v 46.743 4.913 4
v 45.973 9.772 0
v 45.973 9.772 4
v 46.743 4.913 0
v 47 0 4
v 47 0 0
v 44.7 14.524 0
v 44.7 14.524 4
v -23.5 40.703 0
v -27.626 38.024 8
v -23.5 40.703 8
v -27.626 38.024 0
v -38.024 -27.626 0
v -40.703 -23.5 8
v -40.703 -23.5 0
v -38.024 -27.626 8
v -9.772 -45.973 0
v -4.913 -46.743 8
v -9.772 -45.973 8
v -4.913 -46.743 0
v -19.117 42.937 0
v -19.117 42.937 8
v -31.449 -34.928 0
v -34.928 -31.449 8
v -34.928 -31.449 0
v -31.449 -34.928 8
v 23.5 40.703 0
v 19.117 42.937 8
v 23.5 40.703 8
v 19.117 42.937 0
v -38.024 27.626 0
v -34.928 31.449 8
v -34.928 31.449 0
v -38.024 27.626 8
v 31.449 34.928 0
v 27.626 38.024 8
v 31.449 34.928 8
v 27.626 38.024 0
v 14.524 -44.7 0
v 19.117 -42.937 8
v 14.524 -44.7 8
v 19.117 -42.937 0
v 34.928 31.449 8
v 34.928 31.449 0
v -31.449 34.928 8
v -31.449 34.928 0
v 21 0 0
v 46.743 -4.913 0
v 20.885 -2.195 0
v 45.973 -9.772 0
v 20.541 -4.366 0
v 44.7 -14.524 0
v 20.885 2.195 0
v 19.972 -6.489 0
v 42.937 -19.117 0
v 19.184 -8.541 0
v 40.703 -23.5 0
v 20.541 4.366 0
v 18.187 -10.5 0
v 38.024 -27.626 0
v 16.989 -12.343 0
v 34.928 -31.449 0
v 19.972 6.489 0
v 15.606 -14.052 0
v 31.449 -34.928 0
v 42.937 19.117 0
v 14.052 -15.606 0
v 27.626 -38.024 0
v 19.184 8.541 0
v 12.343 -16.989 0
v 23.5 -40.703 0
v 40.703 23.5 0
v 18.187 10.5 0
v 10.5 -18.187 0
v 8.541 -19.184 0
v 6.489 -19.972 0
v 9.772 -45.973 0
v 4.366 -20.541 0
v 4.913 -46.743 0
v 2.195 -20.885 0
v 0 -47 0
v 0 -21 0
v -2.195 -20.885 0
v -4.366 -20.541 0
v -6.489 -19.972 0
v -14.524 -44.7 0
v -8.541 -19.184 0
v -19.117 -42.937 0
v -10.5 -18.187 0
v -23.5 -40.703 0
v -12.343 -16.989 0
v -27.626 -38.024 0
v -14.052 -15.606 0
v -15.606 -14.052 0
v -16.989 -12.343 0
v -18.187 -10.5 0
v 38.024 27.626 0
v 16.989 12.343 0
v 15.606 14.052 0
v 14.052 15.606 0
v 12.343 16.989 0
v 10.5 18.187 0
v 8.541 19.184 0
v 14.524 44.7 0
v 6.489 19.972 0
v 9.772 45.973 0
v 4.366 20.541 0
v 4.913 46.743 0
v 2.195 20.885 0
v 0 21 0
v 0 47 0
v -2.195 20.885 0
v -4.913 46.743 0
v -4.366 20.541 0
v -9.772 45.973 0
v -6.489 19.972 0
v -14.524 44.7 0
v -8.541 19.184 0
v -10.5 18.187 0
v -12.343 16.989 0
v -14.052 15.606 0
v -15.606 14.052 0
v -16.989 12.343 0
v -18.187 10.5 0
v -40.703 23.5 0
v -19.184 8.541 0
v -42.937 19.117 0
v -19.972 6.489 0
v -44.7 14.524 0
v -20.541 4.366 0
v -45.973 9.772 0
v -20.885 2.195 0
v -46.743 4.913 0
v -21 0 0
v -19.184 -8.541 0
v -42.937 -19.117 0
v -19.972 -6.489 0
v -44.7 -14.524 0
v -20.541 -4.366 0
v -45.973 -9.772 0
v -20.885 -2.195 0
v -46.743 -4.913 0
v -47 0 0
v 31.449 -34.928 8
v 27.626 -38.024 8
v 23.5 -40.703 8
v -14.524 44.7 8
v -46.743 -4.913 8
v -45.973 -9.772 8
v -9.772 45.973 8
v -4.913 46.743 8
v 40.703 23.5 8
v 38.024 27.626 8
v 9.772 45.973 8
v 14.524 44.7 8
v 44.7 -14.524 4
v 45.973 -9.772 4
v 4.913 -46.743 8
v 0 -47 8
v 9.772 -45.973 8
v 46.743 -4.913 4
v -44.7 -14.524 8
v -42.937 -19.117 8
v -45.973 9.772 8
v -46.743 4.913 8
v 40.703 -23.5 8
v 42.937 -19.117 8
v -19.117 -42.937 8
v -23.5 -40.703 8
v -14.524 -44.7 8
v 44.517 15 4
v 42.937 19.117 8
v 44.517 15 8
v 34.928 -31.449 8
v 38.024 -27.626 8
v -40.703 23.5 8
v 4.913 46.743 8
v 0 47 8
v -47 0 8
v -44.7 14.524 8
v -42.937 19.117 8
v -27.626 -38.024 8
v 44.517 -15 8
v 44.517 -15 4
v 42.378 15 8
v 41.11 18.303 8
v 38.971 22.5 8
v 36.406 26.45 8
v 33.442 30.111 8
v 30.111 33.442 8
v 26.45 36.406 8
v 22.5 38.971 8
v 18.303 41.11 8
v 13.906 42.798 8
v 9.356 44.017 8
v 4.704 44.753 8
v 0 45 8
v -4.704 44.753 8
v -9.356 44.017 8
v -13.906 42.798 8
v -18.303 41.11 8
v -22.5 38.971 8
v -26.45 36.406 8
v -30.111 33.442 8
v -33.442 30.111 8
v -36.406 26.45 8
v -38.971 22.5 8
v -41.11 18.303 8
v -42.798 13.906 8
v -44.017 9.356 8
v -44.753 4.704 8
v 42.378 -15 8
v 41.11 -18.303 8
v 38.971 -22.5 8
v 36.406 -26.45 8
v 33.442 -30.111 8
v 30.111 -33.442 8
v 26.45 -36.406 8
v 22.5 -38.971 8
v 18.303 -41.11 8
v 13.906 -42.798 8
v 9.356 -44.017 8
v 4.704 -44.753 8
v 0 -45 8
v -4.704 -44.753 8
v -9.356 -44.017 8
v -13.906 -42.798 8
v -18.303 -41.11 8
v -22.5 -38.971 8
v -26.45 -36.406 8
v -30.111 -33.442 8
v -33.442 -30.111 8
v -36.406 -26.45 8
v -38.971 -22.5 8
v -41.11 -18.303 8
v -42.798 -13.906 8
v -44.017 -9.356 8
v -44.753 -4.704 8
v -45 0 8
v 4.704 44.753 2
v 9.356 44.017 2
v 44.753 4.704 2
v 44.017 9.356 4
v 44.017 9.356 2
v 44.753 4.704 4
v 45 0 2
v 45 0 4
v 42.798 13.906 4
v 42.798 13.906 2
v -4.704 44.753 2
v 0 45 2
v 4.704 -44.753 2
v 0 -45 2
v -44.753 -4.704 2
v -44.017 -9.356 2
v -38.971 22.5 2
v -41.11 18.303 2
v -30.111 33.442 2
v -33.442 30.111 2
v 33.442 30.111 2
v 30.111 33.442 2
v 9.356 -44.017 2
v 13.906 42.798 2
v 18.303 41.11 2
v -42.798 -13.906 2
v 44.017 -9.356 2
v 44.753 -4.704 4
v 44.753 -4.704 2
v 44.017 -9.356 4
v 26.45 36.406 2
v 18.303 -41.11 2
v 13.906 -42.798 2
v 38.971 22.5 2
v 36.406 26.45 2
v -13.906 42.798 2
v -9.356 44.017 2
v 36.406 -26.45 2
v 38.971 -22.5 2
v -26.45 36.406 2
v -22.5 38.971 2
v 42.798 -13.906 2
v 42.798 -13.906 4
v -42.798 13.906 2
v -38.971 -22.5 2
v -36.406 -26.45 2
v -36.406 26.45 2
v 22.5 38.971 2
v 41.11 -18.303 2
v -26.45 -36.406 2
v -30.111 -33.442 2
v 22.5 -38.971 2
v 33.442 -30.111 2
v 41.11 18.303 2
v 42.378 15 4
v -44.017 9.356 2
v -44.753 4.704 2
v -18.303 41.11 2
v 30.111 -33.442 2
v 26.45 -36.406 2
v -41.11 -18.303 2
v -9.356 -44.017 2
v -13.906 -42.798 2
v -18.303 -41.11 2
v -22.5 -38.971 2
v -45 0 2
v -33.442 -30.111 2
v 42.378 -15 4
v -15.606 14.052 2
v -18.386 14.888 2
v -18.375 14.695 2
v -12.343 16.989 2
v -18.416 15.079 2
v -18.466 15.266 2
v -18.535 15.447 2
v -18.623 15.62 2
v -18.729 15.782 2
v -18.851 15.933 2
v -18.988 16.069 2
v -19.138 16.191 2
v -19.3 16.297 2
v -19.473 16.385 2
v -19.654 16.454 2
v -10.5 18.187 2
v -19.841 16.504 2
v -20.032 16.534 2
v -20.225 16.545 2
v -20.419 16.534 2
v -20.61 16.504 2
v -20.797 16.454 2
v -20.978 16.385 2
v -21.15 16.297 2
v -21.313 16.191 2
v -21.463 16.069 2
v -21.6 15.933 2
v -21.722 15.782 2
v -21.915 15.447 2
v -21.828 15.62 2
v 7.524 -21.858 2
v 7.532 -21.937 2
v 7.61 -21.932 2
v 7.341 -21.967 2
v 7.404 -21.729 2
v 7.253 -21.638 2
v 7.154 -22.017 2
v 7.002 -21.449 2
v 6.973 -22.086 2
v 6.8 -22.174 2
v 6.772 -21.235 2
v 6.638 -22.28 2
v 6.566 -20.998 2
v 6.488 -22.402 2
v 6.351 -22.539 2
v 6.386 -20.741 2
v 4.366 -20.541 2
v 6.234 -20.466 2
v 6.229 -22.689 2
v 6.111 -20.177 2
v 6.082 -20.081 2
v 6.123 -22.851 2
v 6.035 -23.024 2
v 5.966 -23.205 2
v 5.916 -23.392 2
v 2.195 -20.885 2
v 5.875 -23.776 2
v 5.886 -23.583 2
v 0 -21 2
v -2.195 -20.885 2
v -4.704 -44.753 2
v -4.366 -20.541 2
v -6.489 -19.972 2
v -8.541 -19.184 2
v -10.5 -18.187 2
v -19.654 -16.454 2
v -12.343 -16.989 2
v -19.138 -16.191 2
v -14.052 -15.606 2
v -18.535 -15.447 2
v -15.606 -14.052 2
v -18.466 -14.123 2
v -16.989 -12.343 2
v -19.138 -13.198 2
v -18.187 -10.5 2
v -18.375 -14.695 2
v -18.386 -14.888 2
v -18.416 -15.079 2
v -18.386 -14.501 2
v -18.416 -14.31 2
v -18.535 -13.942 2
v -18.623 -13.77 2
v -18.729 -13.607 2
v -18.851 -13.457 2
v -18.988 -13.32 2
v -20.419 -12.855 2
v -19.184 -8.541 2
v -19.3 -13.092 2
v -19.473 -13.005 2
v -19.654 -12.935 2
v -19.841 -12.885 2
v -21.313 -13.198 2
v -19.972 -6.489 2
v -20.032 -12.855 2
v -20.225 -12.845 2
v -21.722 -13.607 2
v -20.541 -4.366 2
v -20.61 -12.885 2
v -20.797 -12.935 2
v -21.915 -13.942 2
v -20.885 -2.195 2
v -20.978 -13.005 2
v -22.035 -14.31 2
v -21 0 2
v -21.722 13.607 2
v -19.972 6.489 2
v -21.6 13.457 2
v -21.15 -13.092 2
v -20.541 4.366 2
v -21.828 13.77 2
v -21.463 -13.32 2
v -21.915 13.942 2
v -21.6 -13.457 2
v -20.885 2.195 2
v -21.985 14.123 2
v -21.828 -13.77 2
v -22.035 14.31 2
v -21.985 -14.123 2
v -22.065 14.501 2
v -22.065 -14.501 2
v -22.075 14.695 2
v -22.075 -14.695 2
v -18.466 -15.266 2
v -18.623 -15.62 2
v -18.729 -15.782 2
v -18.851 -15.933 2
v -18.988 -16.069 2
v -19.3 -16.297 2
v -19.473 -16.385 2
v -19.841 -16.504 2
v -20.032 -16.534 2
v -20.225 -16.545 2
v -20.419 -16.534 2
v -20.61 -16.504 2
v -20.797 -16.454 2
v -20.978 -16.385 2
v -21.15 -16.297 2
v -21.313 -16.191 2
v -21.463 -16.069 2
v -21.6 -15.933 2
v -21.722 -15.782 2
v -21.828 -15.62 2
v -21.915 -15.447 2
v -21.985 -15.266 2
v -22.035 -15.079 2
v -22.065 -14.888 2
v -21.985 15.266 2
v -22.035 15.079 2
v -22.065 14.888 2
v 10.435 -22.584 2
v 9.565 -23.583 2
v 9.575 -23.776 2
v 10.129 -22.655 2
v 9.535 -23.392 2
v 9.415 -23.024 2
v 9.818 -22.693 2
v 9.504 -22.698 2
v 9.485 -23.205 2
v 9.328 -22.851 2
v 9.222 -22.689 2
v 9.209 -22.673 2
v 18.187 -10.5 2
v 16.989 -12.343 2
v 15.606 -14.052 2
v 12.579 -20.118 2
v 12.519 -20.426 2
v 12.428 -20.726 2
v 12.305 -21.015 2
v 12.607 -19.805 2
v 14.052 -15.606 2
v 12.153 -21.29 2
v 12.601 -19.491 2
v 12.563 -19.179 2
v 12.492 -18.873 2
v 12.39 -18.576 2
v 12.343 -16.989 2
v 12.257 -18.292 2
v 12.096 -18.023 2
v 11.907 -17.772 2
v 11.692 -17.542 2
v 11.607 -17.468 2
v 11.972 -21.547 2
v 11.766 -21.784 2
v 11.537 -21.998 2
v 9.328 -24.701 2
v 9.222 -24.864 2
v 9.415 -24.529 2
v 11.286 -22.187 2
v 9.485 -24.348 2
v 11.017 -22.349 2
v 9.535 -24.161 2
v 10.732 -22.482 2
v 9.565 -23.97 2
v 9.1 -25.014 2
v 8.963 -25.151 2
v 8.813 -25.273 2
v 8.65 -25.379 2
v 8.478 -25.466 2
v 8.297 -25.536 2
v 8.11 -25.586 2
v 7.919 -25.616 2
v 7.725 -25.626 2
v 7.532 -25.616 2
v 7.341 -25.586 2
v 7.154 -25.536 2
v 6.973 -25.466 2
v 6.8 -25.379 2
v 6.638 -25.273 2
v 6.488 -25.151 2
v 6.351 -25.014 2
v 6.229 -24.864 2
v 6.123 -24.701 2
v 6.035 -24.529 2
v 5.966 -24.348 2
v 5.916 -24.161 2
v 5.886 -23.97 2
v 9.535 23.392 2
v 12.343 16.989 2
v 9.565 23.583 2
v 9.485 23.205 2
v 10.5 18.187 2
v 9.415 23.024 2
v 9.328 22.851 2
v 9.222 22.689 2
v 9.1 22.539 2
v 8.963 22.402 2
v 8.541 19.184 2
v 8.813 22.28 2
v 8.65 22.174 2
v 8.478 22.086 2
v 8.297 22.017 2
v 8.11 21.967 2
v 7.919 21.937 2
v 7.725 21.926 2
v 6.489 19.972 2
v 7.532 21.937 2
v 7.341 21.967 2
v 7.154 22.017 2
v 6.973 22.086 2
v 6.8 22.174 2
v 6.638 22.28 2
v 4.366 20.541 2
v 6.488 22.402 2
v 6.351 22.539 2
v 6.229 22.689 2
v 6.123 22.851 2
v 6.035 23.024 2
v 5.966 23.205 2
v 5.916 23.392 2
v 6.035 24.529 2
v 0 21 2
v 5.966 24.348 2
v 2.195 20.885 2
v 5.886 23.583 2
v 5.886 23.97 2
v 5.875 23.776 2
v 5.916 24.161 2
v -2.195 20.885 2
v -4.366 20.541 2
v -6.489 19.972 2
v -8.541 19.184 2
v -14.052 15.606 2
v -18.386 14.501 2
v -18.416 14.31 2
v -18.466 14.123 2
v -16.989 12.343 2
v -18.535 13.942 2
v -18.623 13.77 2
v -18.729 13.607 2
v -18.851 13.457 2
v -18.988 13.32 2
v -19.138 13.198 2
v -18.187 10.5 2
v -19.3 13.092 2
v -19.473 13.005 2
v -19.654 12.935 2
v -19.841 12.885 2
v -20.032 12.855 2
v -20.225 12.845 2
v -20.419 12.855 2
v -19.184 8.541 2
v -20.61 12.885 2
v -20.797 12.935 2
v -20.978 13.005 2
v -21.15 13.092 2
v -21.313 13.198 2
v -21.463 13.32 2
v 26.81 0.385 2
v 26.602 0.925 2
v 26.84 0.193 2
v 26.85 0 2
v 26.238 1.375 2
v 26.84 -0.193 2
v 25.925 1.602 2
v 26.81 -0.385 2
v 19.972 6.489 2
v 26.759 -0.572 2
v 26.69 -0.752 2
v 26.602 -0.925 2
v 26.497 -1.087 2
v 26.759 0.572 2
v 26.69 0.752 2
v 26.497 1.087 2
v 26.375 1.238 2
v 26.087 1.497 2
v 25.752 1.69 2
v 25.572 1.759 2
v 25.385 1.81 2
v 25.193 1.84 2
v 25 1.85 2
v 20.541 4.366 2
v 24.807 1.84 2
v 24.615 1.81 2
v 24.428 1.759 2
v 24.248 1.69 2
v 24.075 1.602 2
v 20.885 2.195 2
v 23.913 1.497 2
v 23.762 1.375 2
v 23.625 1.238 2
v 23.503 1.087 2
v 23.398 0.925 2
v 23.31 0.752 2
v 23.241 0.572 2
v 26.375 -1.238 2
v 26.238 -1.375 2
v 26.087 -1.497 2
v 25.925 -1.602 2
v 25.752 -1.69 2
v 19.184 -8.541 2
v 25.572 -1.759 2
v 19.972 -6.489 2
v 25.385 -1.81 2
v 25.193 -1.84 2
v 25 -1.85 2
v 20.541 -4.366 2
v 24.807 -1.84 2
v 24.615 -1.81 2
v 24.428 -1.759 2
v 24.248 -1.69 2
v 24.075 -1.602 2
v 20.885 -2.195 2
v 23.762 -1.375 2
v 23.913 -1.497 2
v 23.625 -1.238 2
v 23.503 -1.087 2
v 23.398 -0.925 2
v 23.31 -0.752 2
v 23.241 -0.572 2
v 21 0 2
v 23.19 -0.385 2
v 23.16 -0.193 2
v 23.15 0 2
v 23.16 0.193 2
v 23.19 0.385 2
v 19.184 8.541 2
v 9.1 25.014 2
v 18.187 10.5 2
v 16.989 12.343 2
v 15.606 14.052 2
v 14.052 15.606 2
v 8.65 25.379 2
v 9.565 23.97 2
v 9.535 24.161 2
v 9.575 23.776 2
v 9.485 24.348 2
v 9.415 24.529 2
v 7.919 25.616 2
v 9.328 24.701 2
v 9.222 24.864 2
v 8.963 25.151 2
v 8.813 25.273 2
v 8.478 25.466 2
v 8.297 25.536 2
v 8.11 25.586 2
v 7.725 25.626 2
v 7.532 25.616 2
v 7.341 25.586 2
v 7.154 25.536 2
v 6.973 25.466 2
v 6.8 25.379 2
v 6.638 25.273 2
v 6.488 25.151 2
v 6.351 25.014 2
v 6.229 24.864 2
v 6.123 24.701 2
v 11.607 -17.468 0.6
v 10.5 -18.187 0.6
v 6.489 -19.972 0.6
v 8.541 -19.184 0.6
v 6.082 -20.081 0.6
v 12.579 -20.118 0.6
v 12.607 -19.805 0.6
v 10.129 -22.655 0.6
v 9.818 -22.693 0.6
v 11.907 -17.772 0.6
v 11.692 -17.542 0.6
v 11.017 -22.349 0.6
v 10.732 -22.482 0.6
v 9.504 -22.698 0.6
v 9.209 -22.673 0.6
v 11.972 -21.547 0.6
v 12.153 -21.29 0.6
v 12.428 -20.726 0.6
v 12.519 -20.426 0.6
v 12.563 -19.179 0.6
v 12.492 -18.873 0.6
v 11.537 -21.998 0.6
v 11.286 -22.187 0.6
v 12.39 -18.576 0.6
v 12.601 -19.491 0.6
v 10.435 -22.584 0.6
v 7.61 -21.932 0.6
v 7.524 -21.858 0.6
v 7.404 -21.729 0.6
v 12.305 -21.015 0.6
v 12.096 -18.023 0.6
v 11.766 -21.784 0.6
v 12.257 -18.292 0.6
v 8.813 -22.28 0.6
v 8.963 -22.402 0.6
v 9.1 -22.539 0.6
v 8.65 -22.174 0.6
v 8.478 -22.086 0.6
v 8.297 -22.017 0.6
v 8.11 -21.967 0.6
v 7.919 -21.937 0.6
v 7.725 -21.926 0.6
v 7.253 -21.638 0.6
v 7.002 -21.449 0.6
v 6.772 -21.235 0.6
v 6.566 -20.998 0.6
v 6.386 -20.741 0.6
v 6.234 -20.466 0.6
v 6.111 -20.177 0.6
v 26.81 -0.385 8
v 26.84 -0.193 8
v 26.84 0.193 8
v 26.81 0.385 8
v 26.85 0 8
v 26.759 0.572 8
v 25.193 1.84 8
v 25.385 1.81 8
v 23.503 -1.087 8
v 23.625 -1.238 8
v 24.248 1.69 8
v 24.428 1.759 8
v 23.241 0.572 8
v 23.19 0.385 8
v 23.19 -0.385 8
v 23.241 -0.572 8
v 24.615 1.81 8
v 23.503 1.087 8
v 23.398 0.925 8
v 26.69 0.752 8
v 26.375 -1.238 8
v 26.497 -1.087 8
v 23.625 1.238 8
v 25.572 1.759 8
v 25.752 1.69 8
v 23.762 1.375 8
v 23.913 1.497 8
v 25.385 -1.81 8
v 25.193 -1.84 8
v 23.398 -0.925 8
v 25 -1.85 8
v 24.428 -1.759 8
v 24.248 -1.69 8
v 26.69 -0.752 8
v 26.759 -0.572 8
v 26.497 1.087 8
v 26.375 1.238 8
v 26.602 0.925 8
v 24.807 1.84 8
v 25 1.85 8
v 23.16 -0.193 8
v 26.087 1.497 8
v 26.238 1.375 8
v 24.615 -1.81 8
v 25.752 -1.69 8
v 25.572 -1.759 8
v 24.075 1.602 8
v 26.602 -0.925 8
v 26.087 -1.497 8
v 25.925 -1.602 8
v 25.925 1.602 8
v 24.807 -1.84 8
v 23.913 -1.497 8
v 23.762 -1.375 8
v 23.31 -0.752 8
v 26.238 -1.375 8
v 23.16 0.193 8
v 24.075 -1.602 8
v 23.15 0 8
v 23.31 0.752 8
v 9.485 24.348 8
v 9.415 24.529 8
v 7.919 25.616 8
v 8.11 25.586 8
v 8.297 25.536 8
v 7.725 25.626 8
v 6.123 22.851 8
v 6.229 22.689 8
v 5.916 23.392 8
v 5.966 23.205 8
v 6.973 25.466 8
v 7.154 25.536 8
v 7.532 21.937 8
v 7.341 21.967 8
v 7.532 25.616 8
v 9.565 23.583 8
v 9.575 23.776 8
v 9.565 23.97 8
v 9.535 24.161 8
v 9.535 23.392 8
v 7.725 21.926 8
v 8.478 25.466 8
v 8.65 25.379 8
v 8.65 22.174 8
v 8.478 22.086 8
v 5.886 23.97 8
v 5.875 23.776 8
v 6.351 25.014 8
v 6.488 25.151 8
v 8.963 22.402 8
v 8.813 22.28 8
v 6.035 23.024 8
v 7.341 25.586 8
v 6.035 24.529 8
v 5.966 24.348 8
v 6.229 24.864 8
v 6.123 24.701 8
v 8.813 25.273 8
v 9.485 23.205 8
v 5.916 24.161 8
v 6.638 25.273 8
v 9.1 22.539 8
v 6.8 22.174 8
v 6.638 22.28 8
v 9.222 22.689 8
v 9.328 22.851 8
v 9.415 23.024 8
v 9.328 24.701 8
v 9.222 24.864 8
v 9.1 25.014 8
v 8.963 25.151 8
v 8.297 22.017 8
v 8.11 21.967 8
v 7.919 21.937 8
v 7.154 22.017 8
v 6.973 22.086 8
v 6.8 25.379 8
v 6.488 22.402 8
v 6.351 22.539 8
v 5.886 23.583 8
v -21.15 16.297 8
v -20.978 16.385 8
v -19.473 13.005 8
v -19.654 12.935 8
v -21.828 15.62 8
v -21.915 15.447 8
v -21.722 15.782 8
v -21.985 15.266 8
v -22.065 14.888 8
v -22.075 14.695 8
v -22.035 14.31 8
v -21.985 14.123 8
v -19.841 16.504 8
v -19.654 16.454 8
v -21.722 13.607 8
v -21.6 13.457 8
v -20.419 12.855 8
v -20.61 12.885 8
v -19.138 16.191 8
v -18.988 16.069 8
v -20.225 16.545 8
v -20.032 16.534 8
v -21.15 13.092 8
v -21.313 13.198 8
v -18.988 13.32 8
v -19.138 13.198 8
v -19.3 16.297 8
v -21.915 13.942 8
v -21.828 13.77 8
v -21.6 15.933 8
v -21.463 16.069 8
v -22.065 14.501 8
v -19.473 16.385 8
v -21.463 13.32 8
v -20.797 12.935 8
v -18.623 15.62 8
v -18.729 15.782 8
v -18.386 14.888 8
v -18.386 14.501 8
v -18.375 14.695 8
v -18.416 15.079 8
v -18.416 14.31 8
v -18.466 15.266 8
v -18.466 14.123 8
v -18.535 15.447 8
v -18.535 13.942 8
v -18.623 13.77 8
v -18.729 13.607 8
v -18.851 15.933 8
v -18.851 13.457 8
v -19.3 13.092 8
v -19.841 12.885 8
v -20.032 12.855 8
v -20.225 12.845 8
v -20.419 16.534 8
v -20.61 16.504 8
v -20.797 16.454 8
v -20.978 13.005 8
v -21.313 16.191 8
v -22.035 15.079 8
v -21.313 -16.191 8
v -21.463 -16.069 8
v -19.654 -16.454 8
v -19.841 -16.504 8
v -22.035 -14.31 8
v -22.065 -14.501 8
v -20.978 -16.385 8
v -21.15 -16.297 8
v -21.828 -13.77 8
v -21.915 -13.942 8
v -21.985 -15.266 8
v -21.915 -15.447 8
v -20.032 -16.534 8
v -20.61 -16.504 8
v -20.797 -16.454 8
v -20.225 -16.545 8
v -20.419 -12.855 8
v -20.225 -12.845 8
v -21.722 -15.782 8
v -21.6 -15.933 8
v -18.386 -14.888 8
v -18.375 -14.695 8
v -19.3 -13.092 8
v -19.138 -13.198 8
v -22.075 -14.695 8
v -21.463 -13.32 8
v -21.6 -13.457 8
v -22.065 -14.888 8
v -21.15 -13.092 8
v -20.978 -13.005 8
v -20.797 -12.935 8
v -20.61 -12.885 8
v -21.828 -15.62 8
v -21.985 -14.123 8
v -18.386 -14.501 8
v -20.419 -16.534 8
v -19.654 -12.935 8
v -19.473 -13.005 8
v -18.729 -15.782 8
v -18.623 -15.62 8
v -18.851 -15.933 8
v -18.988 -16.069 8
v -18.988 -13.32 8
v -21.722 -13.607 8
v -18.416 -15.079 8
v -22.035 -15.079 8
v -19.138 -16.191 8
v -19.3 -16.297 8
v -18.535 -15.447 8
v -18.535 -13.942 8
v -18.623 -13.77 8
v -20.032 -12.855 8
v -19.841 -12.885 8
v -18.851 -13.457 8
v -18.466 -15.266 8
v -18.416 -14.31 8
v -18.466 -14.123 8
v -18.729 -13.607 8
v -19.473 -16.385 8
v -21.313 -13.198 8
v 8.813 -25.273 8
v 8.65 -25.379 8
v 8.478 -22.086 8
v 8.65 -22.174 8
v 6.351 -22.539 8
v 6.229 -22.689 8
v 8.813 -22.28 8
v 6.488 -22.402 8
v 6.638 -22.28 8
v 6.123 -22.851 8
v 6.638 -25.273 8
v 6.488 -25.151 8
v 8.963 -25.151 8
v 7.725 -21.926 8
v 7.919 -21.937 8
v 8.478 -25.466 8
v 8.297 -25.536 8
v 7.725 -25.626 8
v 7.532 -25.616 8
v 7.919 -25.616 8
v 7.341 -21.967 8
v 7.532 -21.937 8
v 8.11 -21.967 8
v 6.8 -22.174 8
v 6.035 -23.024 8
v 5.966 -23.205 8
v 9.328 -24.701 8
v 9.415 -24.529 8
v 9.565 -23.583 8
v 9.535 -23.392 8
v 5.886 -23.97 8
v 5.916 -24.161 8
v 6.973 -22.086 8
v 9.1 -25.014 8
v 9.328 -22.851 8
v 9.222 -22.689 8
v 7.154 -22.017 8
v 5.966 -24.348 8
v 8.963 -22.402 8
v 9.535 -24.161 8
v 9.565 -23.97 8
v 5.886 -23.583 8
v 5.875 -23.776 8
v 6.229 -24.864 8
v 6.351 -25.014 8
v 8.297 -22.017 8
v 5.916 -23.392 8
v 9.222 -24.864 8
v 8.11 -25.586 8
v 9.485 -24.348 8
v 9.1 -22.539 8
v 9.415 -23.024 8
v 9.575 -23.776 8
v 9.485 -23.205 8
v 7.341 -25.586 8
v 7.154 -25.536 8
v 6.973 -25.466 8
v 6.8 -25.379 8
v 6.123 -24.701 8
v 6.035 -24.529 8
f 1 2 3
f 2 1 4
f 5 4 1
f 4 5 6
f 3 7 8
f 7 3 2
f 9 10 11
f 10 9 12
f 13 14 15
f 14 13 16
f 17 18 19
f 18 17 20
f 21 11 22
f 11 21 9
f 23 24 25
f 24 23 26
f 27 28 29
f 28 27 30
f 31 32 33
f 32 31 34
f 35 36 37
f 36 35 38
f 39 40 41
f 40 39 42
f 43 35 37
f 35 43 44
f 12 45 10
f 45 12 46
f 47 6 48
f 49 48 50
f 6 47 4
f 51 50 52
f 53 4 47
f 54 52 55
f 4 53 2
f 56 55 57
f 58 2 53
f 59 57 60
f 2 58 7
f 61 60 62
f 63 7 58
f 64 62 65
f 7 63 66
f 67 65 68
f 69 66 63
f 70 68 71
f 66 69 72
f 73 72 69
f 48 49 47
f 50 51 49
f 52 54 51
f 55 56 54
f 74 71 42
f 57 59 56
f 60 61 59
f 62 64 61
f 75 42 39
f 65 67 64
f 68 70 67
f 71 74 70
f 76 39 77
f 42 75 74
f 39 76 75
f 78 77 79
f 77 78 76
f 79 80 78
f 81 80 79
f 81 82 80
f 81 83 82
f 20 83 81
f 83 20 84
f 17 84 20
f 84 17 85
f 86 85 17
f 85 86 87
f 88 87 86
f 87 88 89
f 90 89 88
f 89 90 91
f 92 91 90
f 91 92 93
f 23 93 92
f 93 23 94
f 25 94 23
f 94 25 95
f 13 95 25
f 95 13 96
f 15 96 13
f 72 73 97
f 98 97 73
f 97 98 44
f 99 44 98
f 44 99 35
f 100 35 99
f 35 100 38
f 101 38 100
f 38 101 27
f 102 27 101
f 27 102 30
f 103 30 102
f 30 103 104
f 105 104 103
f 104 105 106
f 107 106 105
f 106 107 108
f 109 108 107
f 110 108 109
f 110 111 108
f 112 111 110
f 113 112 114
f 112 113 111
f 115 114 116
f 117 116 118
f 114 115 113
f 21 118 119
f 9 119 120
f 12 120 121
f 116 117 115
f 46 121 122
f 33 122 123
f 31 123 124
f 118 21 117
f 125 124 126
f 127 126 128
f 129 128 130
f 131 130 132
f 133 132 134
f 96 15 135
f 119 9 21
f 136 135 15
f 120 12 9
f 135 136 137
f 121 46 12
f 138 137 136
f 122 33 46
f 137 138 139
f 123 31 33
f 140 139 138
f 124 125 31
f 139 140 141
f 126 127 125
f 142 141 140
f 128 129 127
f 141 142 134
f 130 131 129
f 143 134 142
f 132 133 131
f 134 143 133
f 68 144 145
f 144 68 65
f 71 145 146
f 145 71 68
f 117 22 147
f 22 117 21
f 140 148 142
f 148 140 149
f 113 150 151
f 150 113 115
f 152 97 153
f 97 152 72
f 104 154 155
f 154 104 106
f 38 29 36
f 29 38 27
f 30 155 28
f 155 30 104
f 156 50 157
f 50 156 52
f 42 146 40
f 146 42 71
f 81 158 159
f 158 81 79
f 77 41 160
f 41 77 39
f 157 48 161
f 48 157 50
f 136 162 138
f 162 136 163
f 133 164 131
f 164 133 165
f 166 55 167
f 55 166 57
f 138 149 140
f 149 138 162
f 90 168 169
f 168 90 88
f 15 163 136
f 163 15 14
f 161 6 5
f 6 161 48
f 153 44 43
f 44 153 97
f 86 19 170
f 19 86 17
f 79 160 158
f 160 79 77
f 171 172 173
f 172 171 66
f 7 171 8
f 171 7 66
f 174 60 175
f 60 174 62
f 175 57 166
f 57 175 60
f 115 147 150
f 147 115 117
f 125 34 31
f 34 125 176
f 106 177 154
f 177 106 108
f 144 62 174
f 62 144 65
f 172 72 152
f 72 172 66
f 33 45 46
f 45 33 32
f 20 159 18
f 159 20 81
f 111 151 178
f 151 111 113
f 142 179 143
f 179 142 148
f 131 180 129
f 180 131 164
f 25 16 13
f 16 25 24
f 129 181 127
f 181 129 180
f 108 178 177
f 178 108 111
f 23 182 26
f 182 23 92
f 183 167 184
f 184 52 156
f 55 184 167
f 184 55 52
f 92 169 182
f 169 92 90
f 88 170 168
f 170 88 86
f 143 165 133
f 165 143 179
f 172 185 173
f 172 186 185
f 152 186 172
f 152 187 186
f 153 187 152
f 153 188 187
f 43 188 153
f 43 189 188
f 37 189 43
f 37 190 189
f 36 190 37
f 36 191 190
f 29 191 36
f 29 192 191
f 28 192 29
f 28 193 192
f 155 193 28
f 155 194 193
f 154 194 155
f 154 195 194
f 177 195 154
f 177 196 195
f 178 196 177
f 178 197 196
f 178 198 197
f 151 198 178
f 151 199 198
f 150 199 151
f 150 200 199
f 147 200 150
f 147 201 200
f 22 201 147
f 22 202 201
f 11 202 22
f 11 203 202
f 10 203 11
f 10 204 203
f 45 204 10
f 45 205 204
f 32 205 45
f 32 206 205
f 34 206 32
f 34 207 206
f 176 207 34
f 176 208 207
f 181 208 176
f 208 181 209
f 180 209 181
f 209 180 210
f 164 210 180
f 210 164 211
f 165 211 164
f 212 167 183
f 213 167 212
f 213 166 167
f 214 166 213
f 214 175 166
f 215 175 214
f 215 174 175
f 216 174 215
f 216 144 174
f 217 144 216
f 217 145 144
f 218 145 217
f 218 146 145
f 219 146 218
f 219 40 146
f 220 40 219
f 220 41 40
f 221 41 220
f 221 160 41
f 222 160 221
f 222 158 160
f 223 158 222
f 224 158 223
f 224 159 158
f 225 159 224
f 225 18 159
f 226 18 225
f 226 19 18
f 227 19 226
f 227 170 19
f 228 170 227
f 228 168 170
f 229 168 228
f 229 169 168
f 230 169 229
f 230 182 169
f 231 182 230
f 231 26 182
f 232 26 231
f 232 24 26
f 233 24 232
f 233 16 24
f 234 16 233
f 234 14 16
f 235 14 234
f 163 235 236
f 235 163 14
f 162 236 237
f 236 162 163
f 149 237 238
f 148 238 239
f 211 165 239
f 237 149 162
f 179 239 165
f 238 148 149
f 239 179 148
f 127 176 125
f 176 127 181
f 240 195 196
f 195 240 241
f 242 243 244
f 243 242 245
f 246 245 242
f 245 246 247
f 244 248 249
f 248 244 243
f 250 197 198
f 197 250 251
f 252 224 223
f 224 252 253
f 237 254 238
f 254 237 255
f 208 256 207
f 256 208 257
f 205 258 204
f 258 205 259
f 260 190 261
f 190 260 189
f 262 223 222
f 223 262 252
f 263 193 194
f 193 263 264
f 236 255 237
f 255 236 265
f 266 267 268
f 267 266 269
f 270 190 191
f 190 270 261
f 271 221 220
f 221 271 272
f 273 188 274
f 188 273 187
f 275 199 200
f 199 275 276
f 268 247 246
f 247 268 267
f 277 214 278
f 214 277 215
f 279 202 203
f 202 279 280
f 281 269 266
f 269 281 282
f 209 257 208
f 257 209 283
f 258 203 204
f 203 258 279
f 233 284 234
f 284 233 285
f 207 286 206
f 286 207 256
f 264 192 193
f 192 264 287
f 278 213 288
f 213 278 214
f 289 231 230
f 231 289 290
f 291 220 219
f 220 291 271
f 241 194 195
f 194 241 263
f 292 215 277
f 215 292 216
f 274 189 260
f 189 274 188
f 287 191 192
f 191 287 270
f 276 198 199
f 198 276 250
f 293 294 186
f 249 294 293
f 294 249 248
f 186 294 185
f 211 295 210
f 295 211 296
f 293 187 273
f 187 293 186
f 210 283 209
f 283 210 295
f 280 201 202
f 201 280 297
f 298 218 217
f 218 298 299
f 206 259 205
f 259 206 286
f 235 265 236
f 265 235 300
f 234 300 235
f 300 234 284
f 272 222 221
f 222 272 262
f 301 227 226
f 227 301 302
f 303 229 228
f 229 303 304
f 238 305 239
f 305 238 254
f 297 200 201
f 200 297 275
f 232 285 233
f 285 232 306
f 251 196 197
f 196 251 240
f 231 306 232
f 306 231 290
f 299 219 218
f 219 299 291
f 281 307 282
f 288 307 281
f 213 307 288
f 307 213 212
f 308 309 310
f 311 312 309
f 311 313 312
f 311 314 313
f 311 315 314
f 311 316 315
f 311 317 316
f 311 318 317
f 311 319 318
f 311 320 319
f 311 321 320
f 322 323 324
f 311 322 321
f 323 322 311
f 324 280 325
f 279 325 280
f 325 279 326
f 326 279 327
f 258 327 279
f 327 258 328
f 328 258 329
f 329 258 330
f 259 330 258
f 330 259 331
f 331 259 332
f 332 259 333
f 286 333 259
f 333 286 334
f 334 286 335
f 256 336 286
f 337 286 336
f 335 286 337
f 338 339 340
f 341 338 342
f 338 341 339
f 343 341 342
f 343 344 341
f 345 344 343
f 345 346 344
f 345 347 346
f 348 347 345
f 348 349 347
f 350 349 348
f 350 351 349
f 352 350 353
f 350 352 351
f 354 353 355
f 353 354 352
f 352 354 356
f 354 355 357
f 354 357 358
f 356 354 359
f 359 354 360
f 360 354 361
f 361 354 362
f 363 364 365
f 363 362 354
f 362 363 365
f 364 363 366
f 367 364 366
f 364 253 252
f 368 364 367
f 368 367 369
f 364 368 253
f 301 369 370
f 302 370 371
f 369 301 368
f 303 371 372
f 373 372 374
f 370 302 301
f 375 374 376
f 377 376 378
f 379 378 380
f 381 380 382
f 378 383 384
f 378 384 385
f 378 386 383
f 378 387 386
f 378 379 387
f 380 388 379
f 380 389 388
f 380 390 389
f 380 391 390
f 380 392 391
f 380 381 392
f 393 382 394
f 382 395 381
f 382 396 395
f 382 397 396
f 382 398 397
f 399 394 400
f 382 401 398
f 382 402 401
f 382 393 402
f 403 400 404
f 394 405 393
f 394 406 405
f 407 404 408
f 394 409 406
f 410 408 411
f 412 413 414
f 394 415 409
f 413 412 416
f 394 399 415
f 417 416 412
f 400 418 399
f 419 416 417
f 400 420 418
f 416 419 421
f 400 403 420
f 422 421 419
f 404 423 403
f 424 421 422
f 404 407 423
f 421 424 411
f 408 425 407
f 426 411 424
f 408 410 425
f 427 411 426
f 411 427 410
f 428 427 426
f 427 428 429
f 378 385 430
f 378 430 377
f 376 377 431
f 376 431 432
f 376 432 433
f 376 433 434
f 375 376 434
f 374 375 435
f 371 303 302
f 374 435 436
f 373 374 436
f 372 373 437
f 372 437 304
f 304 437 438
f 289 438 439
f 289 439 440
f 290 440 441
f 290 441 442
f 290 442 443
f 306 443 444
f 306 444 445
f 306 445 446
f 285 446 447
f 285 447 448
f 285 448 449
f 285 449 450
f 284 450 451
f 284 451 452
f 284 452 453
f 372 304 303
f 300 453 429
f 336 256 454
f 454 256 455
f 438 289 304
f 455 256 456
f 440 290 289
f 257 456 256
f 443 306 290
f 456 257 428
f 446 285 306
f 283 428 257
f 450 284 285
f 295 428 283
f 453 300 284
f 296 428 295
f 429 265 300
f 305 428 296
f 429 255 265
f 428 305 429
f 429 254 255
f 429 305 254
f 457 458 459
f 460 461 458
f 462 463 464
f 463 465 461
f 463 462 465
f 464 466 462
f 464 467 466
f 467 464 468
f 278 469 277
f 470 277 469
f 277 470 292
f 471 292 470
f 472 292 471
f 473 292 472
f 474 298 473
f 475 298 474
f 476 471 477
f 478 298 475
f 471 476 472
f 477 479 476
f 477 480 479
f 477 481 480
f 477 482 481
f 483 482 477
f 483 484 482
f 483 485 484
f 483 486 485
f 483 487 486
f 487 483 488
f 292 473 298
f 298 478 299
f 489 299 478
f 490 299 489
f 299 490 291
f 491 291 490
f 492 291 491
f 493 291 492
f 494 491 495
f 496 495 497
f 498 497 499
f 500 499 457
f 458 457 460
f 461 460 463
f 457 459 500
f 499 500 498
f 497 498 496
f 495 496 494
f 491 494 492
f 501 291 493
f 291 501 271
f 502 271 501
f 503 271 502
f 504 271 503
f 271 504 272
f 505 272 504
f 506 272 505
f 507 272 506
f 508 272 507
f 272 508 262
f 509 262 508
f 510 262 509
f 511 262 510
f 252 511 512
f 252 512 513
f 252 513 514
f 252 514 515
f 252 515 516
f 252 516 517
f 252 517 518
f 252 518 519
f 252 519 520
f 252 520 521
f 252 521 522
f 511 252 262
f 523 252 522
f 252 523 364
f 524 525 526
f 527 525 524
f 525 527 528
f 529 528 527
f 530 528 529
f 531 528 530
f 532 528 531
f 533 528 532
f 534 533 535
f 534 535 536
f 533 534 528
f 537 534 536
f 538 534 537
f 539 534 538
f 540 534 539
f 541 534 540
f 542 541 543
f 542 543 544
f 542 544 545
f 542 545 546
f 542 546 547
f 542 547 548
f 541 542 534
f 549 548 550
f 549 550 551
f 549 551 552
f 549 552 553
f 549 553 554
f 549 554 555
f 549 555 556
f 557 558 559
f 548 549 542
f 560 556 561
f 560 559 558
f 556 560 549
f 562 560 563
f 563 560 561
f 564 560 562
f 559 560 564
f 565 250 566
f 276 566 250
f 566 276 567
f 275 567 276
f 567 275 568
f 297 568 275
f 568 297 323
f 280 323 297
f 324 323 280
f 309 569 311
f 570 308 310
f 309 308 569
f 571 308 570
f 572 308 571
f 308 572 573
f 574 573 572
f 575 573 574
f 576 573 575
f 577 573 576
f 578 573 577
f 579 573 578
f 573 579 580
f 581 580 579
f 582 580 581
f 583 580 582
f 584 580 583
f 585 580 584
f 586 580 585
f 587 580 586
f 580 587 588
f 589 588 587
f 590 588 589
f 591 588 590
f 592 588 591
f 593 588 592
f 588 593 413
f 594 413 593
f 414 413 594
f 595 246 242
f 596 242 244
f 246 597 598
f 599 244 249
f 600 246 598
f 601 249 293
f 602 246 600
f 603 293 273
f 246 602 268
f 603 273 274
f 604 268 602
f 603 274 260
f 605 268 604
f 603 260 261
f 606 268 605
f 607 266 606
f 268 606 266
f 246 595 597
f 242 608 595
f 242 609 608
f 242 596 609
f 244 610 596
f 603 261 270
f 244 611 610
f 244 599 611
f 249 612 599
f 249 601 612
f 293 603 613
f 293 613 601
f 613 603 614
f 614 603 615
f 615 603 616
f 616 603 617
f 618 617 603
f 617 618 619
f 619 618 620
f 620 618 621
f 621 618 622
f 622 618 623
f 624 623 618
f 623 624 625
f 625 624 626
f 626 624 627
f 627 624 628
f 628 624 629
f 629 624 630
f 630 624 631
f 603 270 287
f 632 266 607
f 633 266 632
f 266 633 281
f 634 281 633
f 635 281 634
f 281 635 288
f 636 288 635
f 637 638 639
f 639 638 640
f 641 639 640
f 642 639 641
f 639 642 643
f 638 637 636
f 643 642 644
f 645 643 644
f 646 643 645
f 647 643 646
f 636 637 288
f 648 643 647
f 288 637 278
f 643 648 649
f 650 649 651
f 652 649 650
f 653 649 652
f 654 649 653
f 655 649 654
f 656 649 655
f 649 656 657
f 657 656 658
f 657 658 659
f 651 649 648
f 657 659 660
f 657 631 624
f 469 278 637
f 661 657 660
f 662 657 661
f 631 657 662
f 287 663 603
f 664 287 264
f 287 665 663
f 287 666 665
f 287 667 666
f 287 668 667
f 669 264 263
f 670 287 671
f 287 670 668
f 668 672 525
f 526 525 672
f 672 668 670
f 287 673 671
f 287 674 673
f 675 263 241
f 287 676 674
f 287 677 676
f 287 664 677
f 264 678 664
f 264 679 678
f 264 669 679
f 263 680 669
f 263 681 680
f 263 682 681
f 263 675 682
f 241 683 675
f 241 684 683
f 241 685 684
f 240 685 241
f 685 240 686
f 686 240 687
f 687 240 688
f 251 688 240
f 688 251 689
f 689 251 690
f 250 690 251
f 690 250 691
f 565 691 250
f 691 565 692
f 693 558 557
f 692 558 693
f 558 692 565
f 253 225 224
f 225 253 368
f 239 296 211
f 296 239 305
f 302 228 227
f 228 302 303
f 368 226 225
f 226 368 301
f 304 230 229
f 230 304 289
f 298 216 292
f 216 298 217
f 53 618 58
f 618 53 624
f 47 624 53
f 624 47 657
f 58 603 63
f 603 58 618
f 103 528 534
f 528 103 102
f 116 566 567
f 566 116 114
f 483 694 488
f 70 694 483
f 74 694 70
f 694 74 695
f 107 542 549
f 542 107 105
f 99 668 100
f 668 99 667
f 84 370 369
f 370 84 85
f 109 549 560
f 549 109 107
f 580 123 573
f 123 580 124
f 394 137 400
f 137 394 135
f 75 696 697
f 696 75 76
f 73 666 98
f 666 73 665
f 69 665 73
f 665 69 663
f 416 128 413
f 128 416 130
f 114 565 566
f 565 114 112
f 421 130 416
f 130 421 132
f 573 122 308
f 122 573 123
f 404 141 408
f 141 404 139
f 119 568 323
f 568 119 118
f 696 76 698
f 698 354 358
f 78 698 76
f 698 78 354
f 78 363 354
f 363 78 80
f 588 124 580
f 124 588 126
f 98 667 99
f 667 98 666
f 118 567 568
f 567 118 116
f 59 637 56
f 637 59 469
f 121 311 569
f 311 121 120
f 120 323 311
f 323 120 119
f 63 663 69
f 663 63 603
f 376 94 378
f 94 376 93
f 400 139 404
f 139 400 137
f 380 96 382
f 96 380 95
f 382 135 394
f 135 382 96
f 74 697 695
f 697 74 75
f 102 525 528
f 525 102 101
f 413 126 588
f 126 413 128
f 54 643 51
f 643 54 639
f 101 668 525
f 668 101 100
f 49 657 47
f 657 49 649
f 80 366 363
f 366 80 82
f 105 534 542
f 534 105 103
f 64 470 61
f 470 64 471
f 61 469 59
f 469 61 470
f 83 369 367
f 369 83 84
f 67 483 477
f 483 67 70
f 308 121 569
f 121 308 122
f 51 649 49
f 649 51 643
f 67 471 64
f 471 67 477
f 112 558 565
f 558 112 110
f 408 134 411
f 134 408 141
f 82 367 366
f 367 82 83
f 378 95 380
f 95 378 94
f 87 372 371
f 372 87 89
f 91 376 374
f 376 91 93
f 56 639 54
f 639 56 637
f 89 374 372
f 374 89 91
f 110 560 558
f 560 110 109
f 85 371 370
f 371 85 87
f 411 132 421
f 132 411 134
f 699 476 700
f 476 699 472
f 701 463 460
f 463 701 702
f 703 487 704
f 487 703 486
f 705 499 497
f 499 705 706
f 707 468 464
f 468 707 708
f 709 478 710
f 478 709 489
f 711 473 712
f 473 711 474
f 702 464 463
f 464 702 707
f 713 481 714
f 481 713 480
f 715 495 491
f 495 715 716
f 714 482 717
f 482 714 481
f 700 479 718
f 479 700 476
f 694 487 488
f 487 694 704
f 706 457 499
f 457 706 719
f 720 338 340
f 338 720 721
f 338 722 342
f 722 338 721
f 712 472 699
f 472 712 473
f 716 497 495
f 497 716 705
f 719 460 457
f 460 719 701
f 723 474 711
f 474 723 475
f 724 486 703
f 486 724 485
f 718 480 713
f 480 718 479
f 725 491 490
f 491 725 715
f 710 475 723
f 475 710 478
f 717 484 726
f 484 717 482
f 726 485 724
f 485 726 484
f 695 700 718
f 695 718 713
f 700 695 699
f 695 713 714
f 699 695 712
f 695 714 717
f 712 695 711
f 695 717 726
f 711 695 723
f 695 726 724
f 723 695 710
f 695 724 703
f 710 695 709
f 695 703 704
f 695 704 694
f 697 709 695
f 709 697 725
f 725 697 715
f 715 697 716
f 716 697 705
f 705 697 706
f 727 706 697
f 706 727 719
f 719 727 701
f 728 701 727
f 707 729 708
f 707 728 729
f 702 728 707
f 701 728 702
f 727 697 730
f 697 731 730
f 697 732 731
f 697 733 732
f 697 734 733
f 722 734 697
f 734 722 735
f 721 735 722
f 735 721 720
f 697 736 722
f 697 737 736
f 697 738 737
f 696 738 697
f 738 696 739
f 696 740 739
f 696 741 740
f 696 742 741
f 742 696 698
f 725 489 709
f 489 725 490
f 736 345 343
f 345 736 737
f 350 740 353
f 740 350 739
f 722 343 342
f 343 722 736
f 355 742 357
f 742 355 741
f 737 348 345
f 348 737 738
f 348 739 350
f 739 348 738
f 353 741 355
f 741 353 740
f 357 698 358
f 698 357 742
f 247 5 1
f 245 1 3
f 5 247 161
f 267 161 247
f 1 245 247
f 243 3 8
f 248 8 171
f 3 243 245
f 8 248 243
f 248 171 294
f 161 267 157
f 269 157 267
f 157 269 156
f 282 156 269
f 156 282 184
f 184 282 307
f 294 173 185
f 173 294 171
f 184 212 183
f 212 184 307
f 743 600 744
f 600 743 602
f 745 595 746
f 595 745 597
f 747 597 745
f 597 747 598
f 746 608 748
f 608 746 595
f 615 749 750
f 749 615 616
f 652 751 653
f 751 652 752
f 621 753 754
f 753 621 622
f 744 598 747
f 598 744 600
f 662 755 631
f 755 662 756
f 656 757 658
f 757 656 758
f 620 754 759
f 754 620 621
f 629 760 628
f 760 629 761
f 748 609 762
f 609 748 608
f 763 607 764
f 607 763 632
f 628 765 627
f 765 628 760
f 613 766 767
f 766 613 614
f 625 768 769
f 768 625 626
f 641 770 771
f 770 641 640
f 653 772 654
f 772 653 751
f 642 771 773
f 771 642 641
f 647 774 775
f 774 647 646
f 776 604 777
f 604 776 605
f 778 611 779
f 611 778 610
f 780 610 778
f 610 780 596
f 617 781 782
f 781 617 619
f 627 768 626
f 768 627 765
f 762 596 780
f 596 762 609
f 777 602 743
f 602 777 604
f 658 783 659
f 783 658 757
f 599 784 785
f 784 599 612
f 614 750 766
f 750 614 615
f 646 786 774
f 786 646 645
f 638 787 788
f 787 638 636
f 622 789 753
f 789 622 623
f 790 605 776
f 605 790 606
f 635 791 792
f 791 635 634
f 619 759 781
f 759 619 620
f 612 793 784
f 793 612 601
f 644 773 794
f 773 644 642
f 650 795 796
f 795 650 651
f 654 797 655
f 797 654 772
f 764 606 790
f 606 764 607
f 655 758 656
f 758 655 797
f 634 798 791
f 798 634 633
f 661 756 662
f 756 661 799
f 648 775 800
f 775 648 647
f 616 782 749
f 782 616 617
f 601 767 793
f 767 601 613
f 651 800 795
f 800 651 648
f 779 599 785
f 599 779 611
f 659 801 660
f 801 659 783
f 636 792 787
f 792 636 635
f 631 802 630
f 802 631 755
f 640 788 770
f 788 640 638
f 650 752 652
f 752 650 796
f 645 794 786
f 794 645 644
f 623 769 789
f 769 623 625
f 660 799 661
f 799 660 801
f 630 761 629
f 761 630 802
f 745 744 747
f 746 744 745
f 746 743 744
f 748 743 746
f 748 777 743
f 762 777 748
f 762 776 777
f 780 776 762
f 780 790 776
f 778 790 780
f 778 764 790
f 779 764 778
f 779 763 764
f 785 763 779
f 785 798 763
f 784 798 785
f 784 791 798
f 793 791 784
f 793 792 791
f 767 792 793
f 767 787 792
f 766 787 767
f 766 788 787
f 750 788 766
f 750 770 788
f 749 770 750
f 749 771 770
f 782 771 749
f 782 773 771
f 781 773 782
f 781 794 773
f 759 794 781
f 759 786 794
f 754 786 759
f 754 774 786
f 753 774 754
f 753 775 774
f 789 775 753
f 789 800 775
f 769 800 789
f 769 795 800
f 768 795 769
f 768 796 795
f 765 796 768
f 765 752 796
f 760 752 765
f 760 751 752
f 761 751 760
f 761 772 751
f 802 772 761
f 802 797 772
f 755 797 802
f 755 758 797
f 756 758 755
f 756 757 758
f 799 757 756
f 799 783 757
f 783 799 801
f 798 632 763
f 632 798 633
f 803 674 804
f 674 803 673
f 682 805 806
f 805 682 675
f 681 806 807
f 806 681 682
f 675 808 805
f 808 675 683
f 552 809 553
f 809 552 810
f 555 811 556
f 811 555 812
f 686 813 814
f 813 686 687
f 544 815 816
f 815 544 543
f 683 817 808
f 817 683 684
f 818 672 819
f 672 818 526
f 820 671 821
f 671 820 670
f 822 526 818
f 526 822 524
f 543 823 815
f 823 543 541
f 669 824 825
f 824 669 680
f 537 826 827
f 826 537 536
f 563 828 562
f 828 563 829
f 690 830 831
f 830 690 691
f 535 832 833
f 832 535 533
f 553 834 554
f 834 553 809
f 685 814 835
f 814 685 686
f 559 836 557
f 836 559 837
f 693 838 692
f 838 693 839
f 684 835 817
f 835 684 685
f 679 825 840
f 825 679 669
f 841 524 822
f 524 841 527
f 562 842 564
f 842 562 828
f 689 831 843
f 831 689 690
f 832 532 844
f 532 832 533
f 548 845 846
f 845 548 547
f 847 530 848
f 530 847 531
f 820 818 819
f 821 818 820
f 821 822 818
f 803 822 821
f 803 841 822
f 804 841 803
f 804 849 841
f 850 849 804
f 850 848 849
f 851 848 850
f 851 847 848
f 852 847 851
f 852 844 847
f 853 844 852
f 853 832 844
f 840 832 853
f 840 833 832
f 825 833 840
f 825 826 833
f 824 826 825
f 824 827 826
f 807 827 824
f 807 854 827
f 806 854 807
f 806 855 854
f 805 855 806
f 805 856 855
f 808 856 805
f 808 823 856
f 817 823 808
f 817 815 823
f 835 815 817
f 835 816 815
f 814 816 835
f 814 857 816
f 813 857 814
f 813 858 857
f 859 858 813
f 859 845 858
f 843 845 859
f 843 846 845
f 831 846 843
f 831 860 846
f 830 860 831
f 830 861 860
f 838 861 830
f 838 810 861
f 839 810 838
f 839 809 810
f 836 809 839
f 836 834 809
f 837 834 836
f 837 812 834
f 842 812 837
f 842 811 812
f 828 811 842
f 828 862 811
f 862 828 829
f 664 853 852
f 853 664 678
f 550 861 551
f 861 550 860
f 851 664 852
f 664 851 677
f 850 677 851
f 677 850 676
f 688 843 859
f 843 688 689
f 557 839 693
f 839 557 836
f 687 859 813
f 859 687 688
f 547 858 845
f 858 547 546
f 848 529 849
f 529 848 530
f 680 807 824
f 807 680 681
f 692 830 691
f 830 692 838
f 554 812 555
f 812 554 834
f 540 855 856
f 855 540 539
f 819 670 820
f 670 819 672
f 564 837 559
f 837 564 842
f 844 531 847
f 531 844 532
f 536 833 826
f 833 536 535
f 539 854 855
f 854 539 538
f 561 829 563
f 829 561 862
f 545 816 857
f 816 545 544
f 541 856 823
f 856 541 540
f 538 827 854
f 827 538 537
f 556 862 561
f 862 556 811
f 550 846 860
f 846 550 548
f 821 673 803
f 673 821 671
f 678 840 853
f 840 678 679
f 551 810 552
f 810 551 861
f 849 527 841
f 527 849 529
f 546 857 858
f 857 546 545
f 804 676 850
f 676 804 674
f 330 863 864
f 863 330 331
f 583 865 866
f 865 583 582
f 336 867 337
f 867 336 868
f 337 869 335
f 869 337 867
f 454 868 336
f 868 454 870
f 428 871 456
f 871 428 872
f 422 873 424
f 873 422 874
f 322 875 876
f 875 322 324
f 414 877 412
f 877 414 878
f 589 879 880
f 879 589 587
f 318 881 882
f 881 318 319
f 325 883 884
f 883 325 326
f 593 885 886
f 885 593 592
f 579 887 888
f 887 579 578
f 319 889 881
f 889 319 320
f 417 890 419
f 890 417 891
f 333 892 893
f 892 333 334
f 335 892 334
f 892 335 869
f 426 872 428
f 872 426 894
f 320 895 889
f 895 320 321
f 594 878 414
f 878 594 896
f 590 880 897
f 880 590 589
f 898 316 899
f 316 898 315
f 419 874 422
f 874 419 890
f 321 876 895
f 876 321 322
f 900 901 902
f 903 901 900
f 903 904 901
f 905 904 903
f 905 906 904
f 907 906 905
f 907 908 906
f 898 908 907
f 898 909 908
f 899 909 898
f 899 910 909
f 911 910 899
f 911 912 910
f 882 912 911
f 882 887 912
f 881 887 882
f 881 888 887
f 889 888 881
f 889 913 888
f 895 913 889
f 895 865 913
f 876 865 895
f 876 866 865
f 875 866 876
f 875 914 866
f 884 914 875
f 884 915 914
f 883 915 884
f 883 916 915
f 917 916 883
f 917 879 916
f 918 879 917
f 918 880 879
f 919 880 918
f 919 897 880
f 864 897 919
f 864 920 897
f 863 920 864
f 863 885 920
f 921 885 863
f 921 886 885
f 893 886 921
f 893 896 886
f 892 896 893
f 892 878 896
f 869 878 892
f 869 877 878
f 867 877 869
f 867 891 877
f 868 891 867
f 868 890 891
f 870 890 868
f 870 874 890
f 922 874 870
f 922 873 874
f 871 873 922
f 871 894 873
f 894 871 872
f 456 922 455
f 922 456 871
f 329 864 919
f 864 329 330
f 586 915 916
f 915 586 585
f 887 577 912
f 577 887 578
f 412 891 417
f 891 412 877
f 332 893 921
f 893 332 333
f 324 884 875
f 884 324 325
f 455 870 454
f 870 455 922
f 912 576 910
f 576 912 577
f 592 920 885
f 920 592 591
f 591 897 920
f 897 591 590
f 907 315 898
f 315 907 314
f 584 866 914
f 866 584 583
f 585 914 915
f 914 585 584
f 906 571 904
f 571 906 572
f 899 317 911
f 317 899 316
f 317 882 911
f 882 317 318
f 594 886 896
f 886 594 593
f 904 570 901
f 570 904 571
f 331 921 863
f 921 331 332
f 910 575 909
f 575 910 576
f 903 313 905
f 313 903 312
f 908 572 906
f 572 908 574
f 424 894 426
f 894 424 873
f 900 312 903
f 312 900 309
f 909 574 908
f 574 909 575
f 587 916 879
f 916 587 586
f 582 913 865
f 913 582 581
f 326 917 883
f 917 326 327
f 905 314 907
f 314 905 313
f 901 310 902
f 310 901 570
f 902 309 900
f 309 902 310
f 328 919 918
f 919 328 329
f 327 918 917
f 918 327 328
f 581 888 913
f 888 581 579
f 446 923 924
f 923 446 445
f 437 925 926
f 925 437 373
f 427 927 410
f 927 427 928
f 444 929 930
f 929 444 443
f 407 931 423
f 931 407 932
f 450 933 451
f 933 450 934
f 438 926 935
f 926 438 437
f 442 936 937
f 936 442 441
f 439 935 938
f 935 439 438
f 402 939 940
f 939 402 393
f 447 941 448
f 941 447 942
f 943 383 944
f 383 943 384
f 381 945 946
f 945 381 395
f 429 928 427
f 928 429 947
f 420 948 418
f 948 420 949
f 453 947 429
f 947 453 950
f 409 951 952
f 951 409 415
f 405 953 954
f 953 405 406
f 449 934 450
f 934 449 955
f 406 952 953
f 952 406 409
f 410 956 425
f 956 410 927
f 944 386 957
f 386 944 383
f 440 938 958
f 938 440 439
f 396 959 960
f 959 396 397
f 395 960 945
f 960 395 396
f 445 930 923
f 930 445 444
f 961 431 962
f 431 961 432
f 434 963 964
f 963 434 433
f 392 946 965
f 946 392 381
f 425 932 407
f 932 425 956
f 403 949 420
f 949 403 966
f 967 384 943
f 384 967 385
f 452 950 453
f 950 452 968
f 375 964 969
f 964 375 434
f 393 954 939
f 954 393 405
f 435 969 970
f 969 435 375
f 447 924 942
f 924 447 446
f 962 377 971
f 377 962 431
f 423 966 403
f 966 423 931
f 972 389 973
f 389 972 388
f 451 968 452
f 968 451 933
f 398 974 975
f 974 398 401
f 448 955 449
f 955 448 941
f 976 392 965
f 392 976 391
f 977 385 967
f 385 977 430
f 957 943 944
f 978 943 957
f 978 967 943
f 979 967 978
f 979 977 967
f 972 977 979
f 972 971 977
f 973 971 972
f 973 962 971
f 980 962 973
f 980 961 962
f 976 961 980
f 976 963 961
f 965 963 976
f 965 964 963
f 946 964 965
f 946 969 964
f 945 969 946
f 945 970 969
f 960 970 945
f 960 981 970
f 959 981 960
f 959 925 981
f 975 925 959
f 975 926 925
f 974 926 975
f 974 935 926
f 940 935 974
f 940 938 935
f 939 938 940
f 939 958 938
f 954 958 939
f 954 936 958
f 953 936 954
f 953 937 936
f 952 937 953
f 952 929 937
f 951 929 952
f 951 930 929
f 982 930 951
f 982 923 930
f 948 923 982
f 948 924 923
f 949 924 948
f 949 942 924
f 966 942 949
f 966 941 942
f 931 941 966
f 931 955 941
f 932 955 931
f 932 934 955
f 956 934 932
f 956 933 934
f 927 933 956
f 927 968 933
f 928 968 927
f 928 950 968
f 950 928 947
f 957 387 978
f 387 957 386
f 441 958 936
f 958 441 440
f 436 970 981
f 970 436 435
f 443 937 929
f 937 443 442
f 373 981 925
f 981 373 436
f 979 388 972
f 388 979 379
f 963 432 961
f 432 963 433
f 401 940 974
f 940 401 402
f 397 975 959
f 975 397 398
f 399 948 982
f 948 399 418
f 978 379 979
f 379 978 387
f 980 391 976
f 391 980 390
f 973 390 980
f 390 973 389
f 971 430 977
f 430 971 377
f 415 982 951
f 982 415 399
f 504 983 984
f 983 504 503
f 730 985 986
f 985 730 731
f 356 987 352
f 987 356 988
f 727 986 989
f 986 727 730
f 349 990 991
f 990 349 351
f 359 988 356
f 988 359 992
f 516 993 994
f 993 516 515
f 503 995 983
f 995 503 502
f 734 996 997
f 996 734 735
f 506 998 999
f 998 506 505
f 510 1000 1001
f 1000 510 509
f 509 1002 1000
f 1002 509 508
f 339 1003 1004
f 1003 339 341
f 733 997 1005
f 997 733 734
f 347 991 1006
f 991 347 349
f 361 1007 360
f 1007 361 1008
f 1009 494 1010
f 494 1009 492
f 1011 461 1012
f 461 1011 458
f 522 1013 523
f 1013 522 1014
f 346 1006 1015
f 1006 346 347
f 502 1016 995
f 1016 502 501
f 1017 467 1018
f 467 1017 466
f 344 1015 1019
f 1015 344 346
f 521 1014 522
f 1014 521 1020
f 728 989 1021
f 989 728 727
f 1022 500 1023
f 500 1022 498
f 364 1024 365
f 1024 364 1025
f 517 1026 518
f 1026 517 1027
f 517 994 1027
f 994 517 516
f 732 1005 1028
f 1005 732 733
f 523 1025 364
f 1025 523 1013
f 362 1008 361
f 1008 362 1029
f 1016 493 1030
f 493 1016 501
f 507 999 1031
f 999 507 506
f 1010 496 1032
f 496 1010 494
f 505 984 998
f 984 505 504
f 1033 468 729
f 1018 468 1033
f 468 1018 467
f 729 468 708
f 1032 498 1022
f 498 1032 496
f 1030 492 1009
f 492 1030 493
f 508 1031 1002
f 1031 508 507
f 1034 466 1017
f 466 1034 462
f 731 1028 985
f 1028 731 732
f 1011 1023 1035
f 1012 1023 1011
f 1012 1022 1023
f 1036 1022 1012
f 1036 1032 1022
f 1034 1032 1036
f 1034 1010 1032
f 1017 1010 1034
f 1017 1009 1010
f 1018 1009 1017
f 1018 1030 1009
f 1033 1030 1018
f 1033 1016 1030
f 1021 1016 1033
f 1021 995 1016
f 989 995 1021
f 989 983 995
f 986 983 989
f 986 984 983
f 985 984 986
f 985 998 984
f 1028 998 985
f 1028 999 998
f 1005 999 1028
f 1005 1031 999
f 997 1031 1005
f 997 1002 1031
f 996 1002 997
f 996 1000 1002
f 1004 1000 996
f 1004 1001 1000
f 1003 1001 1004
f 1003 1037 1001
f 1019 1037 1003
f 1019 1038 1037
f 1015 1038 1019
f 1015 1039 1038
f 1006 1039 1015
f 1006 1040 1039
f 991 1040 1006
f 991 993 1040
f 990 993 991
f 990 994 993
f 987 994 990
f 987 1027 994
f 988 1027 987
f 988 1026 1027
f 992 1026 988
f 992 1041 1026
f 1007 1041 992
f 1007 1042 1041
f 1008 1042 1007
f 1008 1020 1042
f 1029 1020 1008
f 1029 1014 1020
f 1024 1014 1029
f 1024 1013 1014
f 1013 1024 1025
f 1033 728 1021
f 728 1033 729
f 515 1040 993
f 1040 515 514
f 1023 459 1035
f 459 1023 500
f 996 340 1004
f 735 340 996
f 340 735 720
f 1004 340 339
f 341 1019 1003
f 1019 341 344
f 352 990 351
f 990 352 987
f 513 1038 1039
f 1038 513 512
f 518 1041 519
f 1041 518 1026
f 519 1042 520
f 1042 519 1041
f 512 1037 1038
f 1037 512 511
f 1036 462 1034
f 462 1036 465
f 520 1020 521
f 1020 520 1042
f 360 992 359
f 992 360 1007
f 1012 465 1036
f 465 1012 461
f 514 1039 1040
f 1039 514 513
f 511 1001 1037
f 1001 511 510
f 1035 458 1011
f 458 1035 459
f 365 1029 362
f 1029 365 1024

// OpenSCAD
// file: modules.scad
/*
This is a collection of the modules which are used heavily within the whole project.
Almost all parts rely on the modules to remain "as is", especially regarding their current orientation.
So please act very carefully here, otherwise you may screw up the complete design!

*/

// roof module - this is heavily used for dovetail cutouts
// please keep as is
module roof(l, w, h){
    polyhedron(
        points=[
            [0,0,0],
            [l,0,0],
            [l,w,0],
            [0,w,0],
            [0,w/2,h],
            [l,w/2,h]
            ],
        faces=[
            [0,1,2,3],
            [0,4,1],
            [1,4,5,2],
            [2,5,3],
            [3,5,4,0]
            ]
            );
    };

// a wedge module - this is heavily used for cutting edges
// please keep as is    

module wedge(l, w, h) {
    polyhedron(
            points=[
                [0,0,0],
                [l,0,0],
                [l,w,0],
                [0,w,0],
                [0,0,h],
                [l,0,h]
            ],
            faces=[
                [0,3,2,1],
                [0,1,5,4],
                [1,2,5],
                [2,3,4,5],
                [3,0,4]
            ]
    );
   };


// simple tube module.   
module tube(d1, d2, h) {
    difference() {
        cylinder(d=d1, h=h);
        cylinder(d=d2, h=h);
        };
    };

// mainly used for making holes for countersunk screws
// please keep as is    
module countersunk_screw(vScrew_d, vScrew_l){
    union(){
    cylinder(d=vScrew_d, h= vScrew_l);
    cylinder(d1=vScrew_d*2, h=vScrew_d);
    };
};

// module for making hexagons, e.g. hex nuts. kw is the key width
// please keep as is
module hex(kw, h) {
	render()
        translate([0, 0, h/2])
            intersection_for(a = [0, 120, 240]) {
                rotate([0, 0, a])
                    cube([kw, 3 * kw, h], true);
                }
}


// modult for a pie slice
module pie_slice(a, r, h){
  // a:angle, r:radius, h:height
  rotate_extrude(angle=a) square([r,h]);
}
//pie_slice(110,20,3);
// file: config.scad
/*
This is the base configuration file for the shutter
*/

$fn = 60;

// general tolerance
vTolerance = 0.2;

vMaxAperture = 40;

vNoOfBlades = 5;
vBladeAxis_d = 4;
vBladeAngle = 360/vNoOfBlades;

vBladeBase_r = vMaxAperture/2 + 1;
vBladeBase_h = 2;
vBladeBase_offsetX = 0;
vBladeBase_offsetY = 0;
vBladeBase_offsetZ = 0;

vBladeRib_l = vMaxAperture;
vBladeRib_w = vBladeAxis_d*2.5/2;
vBladeRib_h = vBladeBase_h;
vBladeRib_offsetX = 0;
vBladeRib_offsetY = 0;
vBladeRib_offsetZ = 0;

vBladeEye_d = 2.5* vBladeAxis_d;
vBladeEye_offsetX = vBladeRib_l;
vBladeEye_offsetY = 0;
vBladeEye_offsetZ = 0;

vBladeAxisHole_d = vBladeAxis_d + vTolerance;
vBladeAxisHole_h = vBladeBase_h;
vBladeAxisHole_offsetX = vBladeRib_l;
vBladeAxisHole_offsetY = 0;
vBladeAxisHole_offsetZ = 0;

vLightSeal_l = vBladeBase_r;
vLightSeal_w = vBladeBase_h;
vLightSeal_h = -vLightSeal_w/2;
vLightSeal_offsetX = 0;
vLightSeal_offsetY = 0;
vLightSeal_offsetZ = 0;

vLightSealNeg_l = vBladeBase_r+vBladeBase_h;
vLightSealNeg_w = vBladeBase_h;
vLightSealNeg_h = -vLightSealNeg_w/2;
vLightSealNeg_offsetX = -vBladeBase_h/2;
vLightSealNeg_offsetY = 0;
vLightSealNeg_offsetZ = 0;

vCaseOuter_d = 2.5*vMaxAperture;
vCase_walls = 2;
vCaseInner_d = vCaseOuter_d-(2*vCase_walls);
vCaseOuter_h = 8;
vCaseInner_h = vCaseOuter_h - vCase_walls;
vCaseInner_offsetX = 0;
vCaseInner_offsetY = 0;
vCaseInner_offsetZ = vCase_walls;
// main file
// loading the base configuration
include <config.scad>;

// some modules such as hex, countersunk screws, roof, wedge are available in a module file
use <modules.scad>;



union(){
    difference(){
        cylinder(d=94, h=8);
        
        translate([0,0,2])
            cylinder(d=90, h=6);
        
        cylinder(d=42, h = 2);
        
        translate([25,0,0.6])
        rotate([0,0,-128])
            translate([25,0,0])
                cylinder(d=6, h=2);
        translate([25,0,0])
        rotate([0,0,-130])
            translate([25,0,0.6])
                cylinder(d=6, h=2);
        
        translate([40, -15, 4])
            cube([20, 30, 4]);
        }
    
    for (a =[0:1:vNoOfBlades-1]){
            rotate([0, 0, a*vBladeAngle])
                translate([25, 0, 0])
                    cylinder(d=3.7, h=8 );
        };

}
